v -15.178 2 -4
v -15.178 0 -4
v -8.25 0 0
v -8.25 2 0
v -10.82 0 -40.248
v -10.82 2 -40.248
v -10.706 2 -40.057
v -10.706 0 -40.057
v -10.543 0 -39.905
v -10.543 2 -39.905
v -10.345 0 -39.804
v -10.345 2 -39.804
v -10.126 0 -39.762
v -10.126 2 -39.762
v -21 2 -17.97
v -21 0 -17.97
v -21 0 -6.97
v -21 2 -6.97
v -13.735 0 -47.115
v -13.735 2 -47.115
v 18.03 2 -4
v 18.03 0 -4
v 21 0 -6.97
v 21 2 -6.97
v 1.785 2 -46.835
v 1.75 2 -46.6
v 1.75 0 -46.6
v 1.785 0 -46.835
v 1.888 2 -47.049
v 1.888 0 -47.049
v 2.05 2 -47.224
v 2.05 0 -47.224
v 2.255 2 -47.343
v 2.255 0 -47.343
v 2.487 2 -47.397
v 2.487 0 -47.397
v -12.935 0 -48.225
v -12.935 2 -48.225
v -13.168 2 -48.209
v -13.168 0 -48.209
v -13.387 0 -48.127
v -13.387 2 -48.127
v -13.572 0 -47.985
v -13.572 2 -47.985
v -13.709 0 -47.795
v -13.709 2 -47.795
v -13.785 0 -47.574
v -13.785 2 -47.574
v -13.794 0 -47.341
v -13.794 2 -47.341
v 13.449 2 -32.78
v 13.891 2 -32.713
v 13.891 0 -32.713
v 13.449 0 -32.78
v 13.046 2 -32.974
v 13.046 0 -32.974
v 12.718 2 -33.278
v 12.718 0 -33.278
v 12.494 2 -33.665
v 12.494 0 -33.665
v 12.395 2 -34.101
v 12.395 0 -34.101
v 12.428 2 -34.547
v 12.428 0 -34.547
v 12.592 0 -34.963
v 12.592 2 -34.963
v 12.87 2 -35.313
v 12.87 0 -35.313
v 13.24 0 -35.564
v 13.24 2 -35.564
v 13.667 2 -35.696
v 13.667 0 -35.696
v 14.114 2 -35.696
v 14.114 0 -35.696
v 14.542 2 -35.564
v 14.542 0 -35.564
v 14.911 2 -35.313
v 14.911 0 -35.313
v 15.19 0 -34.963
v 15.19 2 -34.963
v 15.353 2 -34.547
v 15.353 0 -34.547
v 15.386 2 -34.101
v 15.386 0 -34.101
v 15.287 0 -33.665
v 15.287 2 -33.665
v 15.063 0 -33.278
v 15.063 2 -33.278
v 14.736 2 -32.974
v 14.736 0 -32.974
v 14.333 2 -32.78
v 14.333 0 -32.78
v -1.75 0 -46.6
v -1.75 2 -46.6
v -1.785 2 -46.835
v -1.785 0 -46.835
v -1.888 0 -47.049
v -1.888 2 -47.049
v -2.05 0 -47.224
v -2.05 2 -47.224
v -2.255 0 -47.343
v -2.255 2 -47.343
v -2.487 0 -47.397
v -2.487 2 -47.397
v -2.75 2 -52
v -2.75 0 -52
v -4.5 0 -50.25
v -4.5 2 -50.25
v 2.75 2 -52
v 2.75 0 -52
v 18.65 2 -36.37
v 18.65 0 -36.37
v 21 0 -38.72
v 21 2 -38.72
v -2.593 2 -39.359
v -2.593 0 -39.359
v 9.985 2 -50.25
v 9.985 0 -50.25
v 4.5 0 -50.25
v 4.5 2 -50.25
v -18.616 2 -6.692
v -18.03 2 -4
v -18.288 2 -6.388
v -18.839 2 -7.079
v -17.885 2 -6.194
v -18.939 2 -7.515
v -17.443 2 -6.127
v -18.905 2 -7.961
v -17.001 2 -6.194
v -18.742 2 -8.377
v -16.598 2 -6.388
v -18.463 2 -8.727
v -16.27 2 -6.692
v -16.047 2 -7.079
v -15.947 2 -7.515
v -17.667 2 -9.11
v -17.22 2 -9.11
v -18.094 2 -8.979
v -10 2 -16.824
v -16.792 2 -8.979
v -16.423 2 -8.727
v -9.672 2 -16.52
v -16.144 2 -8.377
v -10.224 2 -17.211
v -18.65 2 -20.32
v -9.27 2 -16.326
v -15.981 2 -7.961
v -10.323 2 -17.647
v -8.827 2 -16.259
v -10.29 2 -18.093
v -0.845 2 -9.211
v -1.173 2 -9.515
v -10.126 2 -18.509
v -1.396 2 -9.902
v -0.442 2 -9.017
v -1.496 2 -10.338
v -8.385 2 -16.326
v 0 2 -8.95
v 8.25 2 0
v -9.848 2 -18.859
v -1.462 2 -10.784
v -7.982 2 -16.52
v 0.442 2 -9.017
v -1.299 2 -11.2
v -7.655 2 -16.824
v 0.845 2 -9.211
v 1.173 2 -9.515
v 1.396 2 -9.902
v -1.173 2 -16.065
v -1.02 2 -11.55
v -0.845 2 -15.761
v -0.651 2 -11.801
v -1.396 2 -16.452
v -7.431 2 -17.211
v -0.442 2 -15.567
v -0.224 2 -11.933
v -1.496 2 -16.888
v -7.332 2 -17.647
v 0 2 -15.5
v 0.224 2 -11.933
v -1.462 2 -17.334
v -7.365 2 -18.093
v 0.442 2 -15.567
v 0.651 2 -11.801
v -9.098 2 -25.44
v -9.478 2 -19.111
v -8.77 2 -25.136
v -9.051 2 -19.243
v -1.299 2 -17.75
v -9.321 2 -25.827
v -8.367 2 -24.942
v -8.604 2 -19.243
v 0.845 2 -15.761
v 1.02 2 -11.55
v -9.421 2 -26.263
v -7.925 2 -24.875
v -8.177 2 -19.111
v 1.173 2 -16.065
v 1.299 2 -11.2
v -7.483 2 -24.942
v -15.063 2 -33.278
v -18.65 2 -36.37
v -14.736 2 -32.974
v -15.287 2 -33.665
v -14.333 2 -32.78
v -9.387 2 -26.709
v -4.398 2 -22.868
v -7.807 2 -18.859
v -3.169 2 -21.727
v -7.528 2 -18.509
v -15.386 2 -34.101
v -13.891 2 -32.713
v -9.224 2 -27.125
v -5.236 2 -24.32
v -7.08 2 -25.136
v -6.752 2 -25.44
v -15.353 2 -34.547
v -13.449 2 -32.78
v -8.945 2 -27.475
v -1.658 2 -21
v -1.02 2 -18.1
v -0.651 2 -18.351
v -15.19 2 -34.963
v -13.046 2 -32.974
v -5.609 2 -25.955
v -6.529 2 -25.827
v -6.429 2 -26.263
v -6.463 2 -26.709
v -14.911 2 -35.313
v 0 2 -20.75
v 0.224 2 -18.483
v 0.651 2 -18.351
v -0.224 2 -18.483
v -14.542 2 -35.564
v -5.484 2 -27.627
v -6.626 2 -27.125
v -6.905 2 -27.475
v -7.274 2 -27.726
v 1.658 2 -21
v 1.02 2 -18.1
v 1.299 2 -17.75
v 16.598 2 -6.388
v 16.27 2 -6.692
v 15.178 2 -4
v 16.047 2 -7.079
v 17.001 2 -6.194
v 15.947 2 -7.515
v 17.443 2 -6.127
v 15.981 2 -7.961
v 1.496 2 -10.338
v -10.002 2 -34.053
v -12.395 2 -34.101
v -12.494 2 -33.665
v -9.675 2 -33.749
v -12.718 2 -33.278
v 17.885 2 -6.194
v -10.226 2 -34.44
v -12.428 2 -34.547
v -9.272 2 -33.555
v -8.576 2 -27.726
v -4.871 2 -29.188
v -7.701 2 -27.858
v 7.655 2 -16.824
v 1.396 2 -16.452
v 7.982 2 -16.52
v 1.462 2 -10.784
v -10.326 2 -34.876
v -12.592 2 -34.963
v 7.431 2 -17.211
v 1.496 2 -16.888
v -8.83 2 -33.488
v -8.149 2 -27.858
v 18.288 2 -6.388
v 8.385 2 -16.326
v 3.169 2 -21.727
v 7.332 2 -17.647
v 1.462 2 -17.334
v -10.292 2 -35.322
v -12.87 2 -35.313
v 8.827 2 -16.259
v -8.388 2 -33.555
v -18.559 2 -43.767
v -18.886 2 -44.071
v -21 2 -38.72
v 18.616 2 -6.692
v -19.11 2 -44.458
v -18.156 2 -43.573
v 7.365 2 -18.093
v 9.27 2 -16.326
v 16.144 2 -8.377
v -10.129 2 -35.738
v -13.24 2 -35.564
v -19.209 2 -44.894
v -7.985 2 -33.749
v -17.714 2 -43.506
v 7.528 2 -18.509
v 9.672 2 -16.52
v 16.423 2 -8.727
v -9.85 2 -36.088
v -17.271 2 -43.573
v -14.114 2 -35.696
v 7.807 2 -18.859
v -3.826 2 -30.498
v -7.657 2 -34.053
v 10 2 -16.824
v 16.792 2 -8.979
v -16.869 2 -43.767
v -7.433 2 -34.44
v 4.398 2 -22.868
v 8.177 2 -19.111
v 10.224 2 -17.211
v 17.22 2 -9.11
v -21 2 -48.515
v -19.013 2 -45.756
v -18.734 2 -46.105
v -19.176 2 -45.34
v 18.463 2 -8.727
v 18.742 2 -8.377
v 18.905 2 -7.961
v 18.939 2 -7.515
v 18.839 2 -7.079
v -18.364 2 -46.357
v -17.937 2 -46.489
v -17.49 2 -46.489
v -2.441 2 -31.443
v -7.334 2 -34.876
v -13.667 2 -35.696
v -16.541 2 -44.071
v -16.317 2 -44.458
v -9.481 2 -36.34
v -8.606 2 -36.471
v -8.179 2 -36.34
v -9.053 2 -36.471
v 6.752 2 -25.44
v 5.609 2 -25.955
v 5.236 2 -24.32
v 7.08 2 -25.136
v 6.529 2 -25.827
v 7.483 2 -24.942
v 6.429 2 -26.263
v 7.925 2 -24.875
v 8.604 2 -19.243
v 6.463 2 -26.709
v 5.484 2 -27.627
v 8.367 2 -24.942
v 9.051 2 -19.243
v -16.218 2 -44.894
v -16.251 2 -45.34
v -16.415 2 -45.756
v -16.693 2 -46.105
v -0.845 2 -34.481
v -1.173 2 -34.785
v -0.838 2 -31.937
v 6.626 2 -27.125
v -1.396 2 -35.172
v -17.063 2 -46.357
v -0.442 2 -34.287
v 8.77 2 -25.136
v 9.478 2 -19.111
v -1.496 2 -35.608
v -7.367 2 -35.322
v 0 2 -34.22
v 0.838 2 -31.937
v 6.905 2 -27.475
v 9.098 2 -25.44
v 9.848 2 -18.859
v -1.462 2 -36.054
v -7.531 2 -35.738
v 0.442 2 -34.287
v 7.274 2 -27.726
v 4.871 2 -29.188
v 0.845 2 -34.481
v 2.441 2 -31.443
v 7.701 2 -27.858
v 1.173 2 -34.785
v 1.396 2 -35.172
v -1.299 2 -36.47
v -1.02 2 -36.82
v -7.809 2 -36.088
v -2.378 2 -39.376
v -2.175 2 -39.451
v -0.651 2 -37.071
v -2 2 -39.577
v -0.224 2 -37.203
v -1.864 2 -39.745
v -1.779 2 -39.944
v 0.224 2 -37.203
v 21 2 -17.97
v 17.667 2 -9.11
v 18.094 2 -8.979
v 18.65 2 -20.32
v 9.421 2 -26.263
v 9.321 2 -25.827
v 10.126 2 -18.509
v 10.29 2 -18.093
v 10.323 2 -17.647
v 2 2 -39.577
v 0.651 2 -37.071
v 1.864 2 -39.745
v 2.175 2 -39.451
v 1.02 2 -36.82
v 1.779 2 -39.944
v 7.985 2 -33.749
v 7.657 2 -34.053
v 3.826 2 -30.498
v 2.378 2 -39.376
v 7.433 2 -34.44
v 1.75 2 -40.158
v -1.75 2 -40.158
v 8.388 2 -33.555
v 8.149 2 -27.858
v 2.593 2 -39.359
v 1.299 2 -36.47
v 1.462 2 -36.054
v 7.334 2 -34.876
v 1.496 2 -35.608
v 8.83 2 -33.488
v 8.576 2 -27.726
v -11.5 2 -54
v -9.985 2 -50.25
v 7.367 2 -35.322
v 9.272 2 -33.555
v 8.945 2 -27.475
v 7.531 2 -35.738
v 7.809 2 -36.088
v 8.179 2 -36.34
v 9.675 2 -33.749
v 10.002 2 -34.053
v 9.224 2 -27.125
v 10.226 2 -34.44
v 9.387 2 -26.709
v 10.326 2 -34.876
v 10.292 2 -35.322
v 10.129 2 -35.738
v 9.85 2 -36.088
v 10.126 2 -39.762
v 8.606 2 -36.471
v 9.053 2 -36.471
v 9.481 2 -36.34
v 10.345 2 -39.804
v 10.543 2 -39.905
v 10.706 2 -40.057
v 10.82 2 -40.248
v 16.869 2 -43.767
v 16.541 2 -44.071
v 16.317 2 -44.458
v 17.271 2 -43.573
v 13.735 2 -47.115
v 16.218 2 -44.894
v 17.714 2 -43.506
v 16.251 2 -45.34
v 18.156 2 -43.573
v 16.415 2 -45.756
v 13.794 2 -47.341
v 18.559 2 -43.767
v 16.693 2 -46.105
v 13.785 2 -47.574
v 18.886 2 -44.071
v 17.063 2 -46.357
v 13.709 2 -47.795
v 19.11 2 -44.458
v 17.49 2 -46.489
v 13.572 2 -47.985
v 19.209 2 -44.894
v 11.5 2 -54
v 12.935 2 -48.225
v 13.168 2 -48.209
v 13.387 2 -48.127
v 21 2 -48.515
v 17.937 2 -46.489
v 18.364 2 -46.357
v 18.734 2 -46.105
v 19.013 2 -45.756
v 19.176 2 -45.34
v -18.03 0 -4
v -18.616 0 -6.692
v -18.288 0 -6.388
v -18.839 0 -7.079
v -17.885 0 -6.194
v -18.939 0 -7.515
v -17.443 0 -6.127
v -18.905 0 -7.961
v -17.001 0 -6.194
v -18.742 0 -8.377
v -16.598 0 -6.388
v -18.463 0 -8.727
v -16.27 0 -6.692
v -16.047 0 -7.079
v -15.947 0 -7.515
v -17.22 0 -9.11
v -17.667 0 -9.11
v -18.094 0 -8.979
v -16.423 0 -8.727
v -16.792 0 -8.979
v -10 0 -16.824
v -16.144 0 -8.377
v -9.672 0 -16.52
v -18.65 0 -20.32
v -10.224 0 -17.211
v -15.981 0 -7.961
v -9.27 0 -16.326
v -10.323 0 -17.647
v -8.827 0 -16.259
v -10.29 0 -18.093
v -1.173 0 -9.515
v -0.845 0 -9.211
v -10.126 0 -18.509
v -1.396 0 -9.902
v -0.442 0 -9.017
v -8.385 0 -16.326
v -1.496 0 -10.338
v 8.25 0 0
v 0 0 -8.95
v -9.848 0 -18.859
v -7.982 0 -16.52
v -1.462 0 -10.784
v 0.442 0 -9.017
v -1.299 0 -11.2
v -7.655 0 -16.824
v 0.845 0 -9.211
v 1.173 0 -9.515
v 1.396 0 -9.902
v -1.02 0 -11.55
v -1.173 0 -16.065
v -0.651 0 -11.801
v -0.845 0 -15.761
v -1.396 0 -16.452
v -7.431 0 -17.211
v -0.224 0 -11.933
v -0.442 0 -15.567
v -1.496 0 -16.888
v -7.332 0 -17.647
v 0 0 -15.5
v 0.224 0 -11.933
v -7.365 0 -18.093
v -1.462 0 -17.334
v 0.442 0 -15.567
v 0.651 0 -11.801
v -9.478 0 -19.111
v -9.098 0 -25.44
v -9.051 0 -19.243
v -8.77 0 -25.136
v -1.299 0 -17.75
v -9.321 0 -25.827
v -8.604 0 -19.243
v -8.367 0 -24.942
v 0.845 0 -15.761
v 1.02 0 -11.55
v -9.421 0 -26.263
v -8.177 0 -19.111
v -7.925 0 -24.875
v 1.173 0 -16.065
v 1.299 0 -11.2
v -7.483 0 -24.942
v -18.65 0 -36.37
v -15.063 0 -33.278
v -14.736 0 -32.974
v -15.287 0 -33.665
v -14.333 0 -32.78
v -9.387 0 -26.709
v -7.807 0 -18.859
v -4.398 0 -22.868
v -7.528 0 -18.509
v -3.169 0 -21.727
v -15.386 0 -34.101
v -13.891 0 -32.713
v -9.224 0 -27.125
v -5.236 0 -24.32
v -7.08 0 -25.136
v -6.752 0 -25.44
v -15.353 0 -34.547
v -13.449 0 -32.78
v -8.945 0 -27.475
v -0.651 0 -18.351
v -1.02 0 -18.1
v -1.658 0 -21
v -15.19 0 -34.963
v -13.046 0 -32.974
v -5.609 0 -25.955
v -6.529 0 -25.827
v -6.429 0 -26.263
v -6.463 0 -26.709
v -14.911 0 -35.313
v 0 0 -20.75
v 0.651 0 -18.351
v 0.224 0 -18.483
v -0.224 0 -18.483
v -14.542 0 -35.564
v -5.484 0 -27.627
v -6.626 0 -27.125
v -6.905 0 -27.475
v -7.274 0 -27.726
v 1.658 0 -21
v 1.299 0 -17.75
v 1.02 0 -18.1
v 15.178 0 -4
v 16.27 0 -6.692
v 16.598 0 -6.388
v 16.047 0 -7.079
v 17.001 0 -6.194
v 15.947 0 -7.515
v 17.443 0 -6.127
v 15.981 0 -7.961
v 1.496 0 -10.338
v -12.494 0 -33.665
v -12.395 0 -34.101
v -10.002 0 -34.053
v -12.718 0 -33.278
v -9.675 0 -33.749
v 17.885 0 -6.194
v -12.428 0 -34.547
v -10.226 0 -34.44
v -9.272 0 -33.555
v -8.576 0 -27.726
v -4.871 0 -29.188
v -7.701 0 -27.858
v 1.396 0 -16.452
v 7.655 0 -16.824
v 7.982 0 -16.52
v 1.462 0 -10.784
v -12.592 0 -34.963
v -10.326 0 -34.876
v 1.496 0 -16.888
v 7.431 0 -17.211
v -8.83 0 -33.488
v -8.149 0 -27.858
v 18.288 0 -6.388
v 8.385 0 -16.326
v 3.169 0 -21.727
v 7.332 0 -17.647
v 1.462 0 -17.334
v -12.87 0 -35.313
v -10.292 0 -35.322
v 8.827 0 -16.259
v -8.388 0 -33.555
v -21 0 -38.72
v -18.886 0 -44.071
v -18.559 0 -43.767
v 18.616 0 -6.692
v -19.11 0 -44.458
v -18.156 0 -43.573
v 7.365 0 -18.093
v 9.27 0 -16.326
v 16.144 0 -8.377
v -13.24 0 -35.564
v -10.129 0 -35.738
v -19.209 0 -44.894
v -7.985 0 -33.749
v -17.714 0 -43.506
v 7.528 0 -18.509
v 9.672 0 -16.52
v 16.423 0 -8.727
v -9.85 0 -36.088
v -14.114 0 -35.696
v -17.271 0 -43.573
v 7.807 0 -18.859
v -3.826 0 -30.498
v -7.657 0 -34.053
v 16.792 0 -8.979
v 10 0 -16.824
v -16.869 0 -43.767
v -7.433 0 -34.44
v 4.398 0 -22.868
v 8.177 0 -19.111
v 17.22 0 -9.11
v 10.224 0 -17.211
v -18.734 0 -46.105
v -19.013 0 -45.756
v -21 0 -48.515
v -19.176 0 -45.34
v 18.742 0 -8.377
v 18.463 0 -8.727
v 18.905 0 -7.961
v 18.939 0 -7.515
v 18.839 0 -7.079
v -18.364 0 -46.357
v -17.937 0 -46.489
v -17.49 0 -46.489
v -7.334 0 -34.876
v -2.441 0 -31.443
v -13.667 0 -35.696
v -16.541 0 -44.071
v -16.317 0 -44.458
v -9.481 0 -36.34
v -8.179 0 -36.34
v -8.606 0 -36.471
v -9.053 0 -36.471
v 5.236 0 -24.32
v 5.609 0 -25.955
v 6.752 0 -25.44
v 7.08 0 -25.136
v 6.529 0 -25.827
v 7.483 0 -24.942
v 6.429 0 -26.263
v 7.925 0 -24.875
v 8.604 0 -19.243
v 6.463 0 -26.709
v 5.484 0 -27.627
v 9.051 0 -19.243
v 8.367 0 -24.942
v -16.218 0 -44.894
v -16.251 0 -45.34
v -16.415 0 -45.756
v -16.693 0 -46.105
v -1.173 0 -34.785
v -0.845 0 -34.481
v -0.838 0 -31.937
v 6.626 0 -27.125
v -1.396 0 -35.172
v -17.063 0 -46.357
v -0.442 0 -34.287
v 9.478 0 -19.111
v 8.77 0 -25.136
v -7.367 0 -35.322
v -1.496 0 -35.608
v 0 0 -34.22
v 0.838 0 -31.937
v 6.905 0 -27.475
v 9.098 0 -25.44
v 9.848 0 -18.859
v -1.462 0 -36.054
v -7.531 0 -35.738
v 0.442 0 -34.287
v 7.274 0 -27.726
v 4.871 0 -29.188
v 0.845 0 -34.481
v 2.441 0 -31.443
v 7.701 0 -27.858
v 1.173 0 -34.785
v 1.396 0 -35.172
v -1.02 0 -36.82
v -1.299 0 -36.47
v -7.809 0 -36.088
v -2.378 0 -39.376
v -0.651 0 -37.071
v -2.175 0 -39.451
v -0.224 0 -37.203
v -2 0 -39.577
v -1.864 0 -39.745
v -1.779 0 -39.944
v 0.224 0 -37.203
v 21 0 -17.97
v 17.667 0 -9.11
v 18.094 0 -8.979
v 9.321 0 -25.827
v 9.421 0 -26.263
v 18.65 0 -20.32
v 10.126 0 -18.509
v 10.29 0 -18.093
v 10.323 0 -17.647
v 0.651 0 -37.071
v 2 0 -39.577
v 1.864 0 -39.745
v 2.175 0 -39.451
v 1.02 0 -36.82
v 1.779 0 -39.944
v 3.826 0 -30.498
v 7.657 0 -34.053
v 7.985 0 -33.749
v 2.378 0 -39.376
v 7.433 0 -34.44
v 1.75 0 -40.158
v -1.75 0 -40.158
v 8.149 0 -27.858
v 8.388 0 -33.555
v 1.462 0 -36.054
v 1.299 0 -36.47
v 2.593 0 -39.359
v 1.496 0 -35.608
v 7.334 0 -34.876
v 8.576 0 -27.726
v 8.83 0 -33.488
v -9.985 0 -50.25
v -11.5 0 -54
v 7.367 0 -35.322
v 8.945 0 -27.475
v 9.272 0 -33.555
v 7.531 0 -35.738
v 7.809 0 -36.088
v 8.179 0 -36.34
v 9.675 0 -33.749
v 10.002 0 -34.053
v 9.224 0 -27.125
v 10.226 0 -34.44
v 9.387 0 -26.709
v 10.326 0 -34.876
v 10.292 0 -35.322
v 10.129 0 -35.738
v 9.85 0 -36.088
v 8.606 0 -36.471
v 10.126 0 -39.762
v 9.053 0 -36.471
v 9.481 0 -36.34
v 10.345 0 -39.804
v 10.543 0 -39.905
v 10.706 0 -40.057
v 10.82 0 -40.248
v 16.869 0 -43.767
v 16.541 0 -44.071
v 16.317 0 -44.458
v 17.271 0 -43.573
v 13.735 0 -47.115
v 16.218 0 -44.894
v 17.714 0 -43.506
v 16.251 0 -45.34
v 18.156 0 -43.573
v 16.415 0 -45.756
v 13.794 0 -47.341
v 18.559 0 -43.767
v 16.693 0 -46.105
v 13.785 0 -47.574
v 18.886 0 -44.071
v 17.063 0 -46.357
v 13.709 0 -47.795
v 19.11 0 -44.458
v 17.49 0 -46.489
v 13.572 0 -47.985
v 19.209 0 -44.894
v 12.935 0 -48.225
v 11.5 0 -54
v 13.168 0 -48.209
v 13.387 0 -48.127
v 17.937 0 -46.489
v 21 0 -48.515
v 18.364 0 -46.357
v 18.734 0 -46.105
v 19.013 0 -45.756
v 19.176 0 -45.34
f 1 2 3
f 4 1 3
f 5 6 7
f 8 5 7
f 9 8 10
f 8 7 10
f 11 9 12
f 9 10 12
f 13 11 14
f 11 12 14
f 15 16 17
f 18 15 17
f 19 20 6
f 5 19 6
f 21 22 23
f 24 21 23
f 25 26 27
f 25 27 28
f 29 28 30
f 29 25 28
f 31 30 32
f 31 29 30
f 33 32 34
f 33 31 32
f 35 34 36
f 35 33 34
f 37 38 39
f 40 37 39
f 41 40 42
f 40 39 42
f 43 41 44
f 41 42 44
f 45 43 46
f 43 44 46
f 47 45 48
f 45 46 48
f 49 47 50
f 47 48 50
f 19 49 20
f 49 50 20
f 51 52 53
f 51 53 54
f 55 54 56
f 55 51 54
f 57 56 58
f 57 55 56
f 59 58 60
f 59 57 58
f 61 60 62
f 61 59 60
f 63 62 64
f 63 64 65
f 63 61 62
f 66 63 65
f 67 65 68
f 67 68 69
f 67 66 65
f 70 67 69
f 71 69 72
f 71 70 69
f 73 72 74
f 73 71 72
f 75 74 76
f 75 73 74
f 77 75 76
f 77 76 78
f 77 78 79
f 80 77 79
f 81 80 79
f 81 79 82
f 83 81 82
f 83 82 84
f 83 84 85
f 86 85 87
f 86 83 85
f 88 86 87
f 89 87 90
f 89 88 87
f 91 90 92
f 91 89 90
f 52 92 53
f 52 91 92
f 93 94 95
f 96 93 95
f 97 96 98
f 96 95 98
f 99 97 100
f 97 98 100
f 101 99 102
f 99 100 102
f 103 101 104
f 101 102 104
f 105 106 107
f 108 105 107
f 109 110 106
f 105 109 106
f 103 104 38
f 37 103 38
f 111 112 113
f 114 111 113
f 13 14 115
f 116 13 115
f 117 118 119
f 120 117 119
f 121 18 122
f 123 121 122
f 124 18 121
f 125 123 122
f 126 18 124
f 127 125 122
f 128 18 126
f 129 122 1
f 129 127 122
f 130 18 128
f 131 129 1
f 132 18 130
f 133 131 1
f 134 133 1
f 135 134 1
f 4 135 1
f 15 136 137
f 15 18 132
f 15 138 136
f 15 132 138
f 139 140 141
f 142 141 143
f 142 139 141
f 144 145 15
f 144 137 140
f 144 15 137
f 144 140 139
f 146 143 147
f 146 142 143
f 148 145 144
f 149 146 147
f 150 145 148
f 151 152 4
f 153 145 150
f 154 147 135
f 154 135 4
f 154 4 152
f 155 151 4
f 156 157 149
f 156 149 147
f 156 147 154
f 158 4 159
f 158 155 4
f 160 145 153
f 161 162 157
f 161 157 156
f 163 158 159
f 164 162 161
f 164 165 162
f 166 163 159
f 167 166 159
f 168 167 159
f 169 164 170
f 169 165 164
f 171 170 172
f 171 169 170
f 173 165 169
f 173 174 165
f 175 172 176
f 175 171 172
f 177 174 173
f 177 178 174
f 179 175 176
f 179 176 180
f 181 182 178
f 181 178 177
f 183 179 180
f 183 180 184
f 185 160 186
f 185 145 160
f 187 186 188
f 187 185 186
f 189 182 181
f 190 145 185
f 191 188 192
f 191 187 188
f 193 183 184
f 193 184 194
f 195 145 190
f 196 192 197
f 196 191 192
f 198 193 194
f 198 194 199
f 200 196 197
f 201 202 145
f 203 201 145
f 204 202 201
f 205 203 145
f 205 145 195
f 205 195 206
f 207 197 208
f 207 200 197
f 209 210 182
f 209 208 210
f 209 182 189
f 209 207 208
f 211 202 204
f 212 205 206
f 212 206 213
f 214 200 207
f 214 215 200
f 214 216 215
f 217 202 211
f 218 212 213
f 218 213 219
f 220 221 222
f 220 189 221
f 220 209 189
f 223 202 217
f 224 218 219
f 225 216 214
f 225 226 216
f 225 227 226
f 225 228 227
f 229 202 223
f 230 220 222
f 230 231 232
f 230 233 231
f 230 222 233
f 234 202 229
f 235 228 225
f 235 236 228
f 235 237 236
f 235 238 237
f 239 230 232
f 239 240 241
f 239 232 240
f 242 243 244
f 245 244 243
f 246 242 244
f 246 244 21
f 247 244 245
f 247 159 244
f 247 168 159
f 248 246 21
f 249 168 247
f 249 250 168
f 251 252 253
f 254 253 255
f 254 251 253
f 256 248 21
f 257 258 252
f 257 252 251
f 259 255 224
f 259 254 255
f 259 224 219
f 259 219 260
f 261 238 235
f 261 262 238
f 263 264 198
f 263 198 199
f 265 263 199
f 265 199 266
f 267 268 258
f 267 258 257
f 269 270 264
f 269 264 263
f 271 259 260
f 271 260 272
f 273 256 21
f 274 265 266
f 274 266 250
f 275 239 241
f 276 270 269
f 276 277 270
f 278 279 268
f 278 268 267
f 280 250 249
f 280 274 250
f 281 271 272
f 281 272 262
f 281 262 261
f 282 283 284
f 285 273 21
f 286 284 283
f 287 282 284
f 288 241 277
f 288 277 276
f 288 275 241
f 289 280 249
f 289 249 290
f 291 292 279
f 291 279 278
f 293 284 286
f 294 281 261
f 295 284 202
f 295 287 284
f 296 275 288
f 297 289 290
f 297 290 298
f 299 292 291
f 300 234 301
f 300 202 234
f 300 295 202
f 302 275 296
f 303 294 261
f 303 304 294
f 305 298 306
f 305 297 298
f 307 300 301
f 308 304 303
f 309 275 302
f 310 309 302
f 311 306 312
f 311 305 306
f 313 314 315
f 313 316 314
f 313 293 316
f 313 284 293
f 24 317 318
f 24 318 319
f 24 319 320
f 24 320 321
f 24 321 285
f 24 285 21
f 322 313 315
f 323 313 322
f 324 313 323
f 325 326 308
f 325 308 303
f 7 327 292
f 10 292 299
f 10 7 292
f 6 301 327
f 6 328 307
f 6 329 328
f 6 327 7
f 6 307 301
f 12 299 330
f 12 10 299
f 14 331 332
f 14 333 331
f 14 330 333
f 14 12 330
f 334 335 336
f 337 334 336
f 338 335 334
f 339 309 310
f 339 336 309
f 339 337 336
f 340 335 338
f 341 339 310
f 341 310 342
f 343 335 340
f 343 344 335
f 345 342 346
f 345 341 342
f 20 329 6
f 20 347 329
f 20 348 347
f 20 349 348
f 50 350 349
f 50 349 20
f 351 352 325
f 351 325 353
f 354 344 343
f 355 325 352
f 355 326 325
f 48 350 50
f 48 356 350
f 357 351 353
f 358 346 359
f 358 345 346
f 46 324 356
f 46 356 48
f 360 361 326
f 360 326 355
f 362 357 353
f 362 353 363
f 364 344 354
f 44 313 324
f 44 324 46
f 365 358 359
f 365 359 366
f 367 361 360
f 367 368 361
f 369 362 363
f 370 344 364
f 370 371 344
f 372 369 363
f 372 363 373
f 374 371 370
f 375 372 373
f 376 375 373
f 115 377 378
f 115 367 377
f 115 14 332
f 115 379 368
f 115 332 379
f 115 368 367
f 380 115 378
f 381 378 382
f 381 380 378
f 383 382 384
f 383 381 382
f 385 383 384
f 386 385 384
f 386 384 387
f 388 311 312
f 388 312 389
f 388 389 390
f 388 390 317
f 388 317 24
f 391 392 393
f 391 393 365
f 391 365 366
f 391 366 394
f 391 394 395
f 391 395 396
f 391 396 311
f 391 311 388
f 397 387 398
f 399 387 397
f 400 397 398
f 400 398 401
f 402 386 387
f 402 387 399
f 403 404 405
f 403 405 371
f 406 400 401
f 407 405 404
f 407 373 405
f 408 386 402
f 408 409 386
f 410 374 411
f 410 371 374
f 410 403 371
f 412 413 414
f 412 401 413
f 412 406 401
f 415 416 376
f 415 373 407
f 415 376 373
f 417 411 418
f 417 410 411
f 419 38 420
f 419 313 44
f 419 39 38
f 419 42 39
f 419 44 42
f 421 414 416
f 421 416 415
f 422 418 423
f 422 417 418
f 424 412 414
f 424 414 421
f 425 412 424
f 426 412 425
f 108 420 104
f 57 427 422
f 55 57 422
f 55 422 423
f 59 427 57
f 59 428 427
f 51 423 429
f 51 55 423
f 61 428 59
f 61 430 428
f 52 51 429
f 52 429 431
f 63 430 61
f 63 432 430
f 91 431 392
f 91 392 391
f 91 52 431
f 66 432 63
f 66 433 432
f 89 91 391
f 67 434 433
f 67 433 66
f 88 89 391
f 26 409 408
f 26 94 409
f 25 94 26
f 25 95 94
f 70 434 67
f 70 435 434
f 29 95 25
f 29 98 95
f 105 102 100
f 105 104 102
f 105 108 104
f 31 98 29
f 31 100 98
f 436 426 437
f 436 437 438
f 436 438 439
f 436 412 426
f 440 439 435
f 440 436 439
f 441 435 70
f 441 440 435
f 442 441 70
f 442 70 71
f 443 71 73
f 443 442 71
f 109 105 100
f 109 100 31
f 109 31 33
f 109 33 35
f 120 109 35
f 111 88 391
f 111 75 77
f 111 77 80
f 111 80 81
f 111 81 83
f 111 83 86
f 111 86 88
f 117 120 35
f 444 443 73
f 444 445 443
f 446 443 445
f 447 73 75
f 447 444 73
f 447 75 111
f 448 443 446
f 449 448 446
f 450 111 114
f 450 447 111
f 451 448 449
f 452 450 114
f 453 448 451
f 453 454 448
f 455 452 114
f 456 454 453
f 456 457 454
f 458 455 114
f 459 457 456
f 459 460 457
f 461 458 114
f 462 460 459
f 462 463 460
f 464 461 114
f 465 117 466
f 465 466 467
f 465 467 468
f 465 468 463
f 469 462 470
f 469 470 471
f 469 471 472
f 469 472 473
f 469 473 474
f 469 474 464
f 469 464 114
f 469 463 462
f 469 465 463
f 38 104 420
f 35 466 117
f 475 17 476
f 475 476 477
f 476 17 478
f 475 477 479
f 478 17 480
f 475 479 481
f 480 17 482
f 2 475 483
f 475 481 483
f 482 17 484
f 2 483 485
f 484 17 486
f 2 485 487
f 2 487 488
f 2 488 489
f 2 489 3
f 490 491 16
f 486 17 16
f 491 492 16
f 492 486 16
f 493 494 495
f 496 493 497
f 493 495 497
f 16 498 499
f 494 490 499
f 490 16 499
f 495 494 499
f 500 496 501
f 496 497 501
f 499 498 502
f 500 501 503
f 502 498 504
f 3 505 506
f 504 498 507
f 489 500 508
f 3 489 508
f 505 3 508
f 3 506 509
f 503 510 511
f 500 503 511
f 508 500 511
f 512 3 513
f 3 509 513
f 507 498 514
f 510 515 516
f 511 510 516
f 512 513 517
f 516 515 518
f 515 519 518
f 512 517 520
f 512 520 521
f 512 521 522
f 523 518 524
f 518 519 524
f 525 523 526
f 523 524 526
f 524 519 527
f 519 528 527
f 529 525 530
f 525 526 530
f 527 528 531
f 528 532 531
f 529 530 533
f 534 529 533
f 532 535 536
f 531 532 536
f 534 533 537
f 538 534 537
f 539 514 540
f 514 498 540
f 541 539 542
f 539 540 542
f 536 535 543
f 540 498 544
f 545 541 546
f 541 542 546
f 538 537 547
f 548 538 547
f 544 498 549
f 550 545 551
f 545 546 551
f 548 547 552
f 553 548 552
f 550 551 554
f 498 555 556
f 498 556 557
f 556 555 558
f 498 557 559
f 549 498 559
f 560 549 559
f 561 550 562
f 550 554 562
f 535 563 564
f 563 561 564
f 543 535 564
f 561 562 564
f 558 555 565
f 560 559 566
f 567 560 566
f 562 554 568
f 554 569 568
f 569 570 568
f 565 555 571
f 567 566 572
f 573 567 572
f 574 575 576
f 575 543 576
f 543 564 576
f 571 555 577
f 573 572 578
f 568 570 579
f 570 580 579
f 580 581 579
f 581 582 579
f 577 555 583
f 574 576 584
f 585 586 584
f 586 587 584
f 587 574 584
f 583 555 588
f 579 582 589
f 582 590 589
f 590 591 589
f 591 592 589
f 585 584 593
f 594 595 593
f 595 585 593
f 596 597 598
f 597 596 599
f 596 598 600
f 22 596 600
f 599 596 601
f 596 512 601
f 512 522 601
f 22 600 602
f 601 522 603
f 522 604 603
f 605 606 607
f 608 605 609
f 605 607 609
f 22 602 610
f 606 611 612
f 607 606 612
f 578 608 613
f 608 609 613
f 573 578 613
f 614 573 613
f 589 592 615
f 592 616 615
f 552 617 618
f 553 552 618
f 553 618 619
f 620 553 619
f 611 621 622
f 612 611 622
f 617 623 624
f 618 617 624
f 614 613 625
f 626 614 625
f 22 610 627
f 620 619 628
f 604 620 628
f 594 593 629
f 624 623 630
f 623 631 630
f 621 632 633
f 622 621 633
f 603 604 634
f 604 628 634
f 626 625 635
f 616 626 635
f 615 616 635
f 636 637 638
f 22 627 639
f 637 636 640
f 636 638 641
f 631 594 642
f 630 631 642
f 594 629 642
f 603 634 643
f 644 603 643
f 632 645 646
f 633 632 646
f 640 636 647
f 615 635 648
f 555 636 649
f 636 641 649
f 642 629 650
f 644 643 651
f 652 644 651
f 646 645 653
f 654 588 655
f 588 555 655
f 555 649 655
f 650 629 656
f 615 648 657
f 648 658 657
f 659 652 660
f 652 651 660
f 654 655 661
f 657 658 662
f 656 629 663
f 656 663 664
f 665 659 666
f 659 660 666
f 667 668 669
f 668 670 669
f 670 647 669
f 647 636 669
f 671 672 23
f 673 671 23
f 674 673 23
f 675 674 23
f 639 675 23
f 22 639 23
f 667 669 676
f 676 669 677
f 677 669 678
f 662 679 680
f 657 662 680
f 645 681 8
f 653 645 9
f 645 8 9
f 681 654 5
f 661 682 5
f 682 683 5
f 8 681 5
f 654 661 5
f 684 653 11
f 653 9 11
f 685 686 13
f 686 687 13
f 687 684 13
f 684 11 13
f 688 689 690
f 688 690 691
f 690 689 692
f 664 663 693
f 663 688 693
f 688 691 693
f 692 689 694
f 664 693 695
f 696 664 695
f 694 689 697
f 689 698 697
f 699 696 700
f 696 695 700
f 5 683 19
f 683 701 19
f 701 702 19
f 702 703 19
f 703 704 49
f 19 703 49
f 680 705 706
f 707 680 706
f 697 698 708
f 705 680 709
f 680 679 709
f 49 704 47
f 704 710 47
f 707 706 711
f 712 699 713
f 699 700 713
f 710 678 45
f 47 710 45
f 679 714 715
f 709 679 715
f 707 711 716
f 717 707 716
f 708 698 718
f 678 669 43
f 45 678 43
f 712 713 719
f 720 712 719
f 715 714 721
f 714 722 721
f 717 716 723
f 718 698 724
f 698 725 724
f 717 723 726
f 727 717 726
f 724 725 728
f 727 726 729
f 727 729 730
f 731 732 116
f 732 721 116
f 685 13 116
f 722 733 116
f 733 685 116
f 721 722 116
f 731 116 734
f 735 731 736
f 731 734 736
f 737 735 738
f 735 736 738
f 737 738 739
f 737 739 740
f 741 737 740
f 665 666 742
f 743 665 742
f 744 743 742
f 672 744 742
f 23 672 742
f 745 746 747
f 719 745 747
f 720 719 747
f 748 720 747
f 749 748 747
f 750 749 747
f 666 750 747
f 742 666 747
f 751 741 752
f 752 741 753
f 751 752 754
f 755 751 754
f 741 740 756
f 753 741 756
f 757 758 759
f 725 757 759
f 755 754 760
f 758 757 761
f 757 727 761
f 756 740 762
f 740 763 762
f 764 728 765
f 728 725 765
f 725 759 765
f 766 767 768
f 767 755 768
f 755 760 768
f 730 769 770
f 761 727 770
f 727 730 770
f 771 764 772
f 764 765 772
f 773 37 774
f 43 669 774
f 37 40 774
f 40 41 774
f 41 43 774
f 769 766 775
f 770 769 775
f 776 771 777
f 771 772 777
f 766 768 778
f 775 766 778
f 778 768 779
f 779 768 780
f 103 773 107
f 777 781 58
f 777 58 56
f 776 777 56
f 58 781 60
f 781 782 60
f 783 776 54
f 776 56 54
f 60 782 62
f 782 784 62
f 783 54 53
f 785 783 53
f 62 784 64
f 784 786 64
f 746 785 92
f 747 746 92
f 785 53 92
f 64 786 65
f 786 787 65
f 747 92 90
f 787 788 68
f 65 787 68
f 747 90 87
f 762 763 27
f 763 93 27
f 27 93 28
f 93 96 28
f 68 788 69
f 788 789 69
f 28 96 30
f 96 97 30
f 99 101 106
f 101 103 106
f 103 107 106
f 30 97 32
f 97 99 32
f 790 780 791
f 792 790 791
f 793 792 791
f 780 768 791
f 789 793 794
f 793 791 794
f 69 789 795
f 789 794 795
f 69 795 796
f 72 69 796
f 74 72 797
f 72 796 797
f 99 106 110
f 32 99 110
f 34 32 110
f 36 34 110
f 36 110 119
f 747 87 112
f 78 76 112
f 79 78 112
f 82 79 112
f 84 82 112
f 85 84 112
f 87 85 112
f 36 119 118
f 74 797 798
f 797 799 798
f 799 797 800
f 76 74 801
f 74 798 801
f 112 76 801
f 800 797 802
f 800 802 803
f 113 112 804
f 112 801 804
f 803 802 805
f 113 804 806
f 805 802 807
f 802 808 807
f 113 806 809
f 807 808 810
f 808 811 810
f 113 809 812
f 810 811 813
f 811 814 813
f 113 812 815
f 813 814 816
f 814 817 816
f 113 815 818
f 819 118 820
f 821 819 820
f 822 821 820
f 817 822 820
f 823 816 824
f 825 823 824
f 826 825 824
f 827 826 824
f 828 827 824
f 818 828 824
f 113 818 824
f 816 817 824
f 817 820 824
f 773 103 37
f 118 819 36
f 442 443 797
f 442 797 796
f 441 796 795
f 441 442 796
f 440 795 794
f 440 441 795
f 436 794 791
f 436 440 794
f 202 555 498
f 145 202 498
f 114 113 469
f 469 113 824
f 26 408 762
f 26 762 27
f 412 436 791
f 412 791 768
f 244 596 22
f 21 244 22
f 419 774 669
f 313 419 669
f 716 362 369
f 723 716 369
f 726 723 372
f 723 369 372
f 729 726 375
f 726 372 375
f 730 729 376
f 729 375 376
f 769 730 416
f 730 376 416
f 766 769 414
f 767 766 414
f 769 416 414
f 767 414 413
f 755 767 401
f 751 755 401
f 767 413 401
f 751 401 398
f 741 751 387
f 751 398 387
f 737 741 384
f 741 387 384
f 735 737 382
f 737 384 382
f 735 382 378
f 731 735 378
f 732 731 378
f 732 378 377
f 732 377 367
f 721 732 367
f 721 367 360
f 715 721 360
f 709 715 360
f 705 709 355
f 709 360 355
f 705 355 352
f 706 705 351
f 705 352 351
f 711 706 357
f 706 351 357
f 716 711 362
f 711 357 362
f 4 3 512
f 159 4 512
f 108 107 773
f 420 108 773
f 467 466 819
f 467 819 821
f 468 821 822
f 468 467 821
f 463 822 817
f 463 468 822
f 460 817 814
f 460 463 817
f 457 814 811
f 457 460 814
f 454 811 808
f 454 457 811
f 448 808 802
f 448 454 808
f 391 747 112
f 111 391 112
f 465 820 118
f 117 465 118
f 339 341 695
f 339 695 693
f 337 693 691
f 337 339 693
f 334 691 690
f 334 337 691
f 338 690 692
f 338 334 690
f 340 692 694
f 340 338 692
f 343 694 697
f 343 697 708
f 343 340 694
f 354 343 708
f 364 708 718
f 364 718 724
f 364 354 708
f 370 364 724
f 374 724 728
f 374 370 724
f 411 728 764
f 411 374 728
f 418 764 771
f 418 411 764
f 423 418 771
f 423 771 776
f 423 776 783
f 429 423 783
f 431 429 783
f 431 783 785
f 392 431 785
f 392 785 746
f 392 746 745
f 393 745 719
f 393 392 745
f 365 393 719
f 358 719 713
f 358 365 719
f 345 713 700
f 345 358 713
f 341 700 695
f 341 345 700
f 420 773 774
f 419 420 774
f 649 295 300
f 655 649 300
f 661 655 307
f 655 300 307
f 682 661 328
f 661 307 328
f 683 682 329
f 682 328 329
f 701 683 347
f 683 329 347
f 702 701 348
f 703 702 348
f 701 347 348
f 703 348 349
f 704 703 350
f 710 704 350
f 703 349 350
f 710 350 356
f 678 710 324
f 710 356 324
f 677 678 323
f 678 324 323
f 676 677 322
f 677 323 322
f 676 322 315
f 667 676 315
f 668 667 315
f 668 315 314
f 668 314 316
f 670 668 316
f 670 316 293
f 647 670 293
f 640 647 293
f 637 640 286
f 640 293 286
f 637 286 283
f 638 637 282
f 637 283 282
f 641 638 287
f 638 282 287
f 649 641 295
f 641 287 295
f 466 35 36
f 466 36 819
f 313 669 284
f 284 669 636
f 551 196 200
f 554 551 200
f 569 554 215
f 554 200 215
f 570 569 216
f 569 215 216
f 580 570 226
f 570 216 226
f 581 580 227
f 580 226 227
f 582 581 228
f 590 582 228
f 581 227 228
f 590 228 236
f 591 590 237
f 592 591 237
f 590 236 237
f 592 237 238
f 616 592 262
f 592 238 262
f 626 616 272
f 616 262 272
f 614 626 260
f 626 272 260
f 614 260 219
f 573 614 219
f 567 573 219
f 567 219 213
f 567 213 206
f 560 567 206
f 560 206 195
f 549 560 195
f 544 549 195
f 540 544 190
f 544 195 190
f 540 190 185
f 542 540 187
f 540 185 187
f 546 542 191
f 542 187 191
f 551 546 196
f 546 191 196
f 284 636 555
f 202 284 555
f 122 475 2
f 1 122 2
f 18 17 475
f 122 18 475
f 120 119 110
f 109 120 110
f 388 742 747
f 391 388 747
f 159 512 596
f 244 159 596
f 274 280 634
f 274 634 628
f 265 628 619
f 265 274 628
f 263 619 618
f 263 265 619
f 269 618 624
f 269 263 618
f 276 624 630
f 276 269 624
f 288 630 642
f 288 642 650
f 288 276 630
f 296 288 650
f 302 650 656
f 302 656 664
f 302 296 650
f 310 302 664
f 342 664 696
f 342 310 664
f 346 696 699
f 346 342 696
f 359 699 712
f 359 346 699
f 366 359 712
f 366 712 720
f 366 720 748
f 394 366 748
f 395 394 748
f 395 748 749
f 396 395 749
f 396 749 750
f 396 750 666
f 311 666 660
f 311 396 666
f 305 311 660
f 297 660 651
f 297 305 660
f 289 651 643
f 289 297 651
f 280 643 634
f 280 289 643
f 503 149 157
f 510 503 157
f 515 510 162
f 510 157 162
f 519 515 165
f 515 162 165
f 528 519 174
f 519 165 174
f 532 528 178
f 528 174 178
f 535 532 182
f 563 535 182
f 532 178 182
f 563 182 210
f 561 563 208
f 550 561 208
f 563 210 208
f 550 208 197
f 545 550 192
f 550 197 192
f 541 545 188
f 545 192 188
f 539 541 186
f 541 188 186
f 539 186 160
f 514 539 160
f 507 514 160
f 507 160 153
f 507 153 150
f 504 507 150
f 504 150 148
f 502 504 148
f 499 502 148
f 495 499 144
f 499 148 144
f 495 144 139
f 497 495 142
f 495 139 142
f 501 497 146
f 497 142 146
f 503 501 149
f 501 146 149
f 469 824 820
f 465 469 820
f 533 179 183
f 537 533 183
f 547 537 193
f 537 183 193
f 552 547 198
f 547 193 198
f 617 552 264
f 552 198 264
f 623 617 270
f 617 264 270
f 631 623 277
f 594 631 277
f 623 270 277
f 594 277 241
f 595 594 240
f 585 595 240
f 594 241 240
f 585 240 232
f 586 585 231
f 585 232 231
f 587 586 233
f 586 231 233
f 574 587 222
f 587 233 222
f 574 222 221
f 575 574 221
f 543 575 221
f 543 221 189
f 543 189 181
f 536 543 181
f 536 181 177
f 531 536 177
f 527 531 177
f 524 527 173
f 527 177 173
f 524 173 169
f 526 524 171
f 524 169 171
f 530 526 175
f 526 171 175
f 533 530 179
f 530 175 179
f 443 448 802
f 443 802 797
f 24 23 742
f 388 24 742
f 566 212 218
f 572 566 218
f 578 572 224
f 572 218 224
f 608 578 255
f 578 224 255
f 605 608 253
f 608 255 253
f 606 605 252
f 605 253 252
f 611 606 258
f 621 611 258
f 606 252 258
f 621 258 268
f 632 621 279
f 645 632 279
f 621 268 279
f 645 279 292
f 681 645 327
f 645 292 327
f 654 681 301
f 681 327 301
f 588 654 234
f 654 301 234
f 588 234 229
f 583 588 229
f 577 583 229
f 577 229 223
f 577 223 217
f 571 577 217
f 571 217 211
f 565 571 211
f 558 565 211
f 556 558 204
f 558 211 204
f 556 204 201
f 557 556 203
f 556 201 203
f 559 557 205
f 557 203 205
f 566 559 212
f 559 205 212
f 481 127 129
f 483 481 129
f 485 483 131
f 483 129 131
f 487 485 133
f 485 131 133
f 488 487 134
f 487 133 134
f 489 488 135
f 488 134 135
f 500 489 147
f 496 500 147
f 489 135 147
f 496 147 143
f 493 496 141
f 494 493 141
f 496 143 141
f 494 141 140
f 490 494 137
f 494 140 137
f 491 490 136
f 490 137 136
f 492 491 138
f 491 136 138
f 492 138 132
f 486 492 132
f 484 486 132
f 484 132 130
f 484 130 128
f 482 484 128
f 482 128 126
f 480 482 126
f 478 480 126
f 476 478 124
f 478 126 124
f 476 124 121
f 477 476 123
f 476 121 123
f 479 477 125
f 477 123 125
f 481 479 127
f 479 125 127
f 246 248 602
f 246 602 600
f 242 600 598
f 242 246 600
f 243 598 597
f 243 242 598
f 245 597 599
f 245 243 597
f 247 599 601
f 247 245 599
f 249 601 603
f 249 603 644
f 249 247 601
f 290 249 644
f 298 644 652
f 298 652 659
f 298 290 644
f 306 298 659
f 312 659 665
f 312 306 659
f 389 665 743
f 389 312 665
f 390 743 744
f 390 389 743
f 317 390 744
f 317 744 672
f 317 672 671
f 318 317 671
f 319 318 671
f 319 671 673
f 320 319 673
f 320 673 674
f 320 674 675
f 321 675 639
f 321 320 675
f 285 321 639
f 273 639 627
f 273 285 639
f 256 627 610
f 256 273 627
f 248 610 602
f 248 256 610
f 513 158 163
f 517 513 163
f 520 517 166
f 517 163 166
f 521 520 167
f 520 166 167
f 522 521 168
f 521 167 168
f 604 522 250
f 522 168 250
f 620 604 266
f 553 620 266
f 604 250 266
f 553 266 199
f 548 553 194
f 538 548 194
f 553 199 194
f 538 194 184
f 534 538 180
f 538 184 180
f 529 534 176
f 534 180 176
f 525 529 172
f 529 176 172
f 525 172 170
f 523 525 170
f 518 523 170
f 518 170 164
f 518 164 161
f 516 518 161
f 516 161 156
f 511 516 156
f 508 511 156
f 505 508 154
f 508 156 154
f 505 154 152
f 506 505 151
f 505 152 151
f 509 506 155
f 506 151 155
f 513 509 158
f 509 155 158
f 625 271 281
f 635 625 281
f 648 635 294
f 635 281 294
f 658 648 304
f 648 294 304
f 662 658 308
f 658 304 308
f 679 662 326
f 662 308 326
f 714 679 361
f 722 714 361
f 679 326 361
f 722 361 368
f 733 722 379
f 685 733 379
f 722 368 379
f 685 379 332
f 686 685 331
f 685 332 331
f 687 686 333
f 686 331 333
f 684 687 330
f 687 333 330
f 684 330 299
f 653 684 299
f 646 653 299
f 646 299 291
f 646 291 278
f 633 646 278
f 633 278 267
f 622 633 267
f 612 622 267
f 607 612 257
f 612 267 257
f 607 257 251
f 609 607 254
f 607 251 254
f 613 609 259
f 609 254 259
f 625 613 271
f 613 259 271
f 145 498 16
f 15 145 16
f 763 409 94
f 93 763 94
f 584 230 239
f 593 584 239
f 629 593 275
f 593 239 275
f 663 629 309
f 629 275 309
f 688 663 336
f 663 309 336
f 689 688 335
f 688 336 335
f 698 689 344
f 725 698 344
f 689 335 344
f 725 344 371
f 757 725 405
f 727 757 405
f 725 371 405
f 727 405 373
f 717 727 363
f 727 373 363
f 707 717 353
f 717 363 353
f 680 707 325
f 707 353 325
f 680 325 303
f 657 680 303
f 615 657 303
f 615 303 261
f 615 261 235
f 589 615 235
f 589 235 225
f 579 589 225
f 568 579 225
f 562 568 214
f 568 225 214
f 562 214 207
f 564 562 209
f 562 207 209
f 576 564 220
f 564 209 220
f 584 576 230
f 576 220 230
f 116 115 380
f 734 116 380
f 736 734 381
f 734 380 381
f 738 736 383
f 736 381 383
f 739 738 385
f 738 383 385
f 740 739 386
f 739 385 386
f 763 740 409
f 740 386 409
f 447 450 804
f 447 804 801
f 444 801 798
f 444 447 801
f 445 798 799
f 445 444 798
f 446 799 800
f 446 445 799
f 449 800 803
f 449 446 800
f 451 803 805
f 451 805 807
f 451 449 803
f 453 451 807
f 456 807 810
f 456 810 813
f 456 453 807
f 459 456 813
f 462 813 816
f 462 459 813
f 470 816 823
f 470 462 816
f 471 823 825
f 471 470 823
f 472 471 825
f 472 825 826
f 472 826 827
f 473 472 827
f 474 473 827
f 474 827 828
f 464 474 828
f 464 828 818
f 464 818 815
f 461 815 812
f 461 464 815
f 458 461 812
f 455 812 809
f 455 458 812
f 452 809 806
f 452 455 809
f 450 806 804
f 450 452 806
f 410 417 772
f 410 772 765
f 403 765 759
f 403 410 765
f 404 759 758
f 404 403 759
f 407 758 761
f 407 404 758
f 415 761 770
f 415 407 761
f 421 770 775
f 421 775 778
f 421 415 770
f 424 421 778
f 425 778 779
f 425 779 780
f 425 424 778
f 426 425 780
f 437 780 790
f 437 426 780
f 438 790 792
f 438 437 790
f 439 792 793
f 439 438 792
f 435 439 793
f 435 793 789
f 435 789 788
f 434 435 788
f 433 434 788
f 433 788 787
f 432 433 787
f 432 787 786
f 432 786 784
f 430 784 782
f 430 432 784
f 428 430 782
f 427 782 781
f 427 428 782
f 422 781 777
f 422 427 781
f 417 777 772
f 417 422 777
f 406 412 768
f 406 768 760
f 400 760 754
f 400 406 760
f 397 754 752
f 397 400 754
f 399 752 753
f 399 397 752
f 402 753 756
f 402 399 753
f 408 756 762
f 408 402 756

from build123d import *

# Parameters (mm, degrees)
BOSS_EXTRUDE1_DEPTH = 2
SKETCH2_R           = 1.5
SKETCH2_R_2         = 5.625
CUT_EXTRUDE1_DEPTH  = 2
CUT_EXTRUDE2_DEPTH  = 2


with BuildPart() as part:
    # Sketch1 → Boss-Extrude1 (new body)
    with BuildSketch(Plane(origin=(0, 0, 0), x_dir=(1, 0, 0), z_dir=(0, 1, 0))):
        Polygon((2.75, 52), (-2.75, 52), (-4.5, 50.25), (-9.984901653, 50.25), (-11.5, 54), (-21, 48.515172443), (-21, 38.719848481), (-18.65, 36.369848481), (-18.65, 20.319848481), (-21, 17.969848481), (-21, 6.969848481), (-18.030151519, 4), (-15.17820323, 4), (-8.25, 0), (8.25, 0), (15.17820323, 4), (18.030151519, 4), (21, 6.969848481), (21, 17.969848481), (18.65, 20.319848481), (18.65, 36.369848481), (21, 38.719848481), (21, 48.515172443), (11.5, 54), (9.984901653, 50.25), (4.5, 50.25), align=None)
    extrude(amount=BOSS_EXTRUDE1_DEPTH)

    # Sketch2 → Cut-Extrude1 (cut)
    with BuildSketch(Plane(origin=(0, 2, 0), x_dir=(1, 0, 0), z_dir=(0, 1, 0))):
        with Locations(Location((-17.713628621, 45.005868893, 0), (0, 0, 270))):
            Circle(SKETCH2_R)
        with Locations(Location((-17.443074505, 7.627226222, 0), (0, 0, 270))):
            Circle(SKETCH2_R)
        with Locations(Location((0, 10.45, 0), (0, 0, 270))):
            Circle(SKETCH2_R)
        with Locations(Location((0, 17, 0), (0, 0, 270))):
            Circle(SKETCH2_R)
        with Locations(Location((0, 26.375, 0), (0, 0, 270))):
            Circle(SKETCH2_R_2)
        with Locations(Location((-8.82739896, 17.75936, 0), (0, 0, 270))):
            Circle(SKETCH2_R)
        with Locations(Location((-7.925, 26.375, 0), (0, 0, 270))):
            Circle(SKETCH2_R)
        with Locations(Location((-13.890686283, 34.212926204, 0), (0, 0, 270))):
            Circle(SKETCH2_R)
        with Locations(Location((-8.829730603, 34.988250401, 0), (0, 0, 270))):
            Circle(SKETCH2_R)
        with Locations(Location((0, 35.72, 0), (0, 0, 270))):
            Circle(SKETCH2_R)
    cut_extrude1 = extrude(amount=-CUT_EXTRUDE1_DEPTH, mode=Mode.SUBTRACT)

    # Mirror1: Cut-Extrude1 across plane
    add(cut_extrude1.mirror(Plane(origin=(0, 0, 0), x_dir=(0, 0, 1), z_dir=(1, 0, 0))), mode=Mode.SUBTRACT)

    # Sketch3 → Cut-Extrude2 (cut)
    with BuildSketch(Plane(origin=(0, 2, 0), x_dir=(1, 0, 0), z_dir=(0, 1, 0))):
        with BuildLine():
            Line((-2.486814901, 47.397027552), (-12.935032384, 48.224828091))
            ThreePointArc((-12.935032384, 48.224828091), (-13.64734637, 47.894907892), (-13.734631847, 47.114767008))
            Line((-13.734631847, 47.114767008), (-10.820083793, 40.247881869))
            ThreePointArc((-10.820083793, 40.247881869), (-10.542892619, 39.905374095), (-10.126394281, 39.761583775))
            Line((-10.126394281, 39.761583775), (-2.592724852, 39.358665124))
            ThreePointArc((-2.592724852, 39.358665124), (-1.999627345, 39.576928954), (-1.75, 40.157523426))
            Line((-1.75, 40.157523426), (-1.75, 46.599526679))
            ThreePointArc((-1.75, 46.599526679), (-1.962399762, 47.142413371), (-2.486814901, 47.397027552))
        make_face()
        with BuildLine():
            Line((10.126394281, 39.761583775), (2.592724852, 39.358665124))
            ThreePointArc((2.592724852, 39.358665124), (1.999627345, 39.576928954), (1.75, 40.157523426))
            Line((1.75, 40.157523426), (1.75, 46.599526679))
            ThreePointArc((1.75, 46.599526679), (1.962399762, 47.142413371), (2.486814901, 47.397027552))
            Line((2.486814901, 47.397027552), (12.935032384, 48.224828091))
            ThreePointArc((12.935032384, 48.224828091), (13.64734637, 47.894907892), (13.734631847, 47.114767008))
            Line((13.734631847, 47.114767008), (10.820083793, 40.247881869))
            ThreePointArc((10.820083793, 40.247881869), (10.542892619, 39.905374095), (10.126394281, 39.761583775))
        make_face()
    extrude(amount=-CUT_EXTRUDE2_DEPTH, mode=Mode.SUBTRACT)


solid = part.part
